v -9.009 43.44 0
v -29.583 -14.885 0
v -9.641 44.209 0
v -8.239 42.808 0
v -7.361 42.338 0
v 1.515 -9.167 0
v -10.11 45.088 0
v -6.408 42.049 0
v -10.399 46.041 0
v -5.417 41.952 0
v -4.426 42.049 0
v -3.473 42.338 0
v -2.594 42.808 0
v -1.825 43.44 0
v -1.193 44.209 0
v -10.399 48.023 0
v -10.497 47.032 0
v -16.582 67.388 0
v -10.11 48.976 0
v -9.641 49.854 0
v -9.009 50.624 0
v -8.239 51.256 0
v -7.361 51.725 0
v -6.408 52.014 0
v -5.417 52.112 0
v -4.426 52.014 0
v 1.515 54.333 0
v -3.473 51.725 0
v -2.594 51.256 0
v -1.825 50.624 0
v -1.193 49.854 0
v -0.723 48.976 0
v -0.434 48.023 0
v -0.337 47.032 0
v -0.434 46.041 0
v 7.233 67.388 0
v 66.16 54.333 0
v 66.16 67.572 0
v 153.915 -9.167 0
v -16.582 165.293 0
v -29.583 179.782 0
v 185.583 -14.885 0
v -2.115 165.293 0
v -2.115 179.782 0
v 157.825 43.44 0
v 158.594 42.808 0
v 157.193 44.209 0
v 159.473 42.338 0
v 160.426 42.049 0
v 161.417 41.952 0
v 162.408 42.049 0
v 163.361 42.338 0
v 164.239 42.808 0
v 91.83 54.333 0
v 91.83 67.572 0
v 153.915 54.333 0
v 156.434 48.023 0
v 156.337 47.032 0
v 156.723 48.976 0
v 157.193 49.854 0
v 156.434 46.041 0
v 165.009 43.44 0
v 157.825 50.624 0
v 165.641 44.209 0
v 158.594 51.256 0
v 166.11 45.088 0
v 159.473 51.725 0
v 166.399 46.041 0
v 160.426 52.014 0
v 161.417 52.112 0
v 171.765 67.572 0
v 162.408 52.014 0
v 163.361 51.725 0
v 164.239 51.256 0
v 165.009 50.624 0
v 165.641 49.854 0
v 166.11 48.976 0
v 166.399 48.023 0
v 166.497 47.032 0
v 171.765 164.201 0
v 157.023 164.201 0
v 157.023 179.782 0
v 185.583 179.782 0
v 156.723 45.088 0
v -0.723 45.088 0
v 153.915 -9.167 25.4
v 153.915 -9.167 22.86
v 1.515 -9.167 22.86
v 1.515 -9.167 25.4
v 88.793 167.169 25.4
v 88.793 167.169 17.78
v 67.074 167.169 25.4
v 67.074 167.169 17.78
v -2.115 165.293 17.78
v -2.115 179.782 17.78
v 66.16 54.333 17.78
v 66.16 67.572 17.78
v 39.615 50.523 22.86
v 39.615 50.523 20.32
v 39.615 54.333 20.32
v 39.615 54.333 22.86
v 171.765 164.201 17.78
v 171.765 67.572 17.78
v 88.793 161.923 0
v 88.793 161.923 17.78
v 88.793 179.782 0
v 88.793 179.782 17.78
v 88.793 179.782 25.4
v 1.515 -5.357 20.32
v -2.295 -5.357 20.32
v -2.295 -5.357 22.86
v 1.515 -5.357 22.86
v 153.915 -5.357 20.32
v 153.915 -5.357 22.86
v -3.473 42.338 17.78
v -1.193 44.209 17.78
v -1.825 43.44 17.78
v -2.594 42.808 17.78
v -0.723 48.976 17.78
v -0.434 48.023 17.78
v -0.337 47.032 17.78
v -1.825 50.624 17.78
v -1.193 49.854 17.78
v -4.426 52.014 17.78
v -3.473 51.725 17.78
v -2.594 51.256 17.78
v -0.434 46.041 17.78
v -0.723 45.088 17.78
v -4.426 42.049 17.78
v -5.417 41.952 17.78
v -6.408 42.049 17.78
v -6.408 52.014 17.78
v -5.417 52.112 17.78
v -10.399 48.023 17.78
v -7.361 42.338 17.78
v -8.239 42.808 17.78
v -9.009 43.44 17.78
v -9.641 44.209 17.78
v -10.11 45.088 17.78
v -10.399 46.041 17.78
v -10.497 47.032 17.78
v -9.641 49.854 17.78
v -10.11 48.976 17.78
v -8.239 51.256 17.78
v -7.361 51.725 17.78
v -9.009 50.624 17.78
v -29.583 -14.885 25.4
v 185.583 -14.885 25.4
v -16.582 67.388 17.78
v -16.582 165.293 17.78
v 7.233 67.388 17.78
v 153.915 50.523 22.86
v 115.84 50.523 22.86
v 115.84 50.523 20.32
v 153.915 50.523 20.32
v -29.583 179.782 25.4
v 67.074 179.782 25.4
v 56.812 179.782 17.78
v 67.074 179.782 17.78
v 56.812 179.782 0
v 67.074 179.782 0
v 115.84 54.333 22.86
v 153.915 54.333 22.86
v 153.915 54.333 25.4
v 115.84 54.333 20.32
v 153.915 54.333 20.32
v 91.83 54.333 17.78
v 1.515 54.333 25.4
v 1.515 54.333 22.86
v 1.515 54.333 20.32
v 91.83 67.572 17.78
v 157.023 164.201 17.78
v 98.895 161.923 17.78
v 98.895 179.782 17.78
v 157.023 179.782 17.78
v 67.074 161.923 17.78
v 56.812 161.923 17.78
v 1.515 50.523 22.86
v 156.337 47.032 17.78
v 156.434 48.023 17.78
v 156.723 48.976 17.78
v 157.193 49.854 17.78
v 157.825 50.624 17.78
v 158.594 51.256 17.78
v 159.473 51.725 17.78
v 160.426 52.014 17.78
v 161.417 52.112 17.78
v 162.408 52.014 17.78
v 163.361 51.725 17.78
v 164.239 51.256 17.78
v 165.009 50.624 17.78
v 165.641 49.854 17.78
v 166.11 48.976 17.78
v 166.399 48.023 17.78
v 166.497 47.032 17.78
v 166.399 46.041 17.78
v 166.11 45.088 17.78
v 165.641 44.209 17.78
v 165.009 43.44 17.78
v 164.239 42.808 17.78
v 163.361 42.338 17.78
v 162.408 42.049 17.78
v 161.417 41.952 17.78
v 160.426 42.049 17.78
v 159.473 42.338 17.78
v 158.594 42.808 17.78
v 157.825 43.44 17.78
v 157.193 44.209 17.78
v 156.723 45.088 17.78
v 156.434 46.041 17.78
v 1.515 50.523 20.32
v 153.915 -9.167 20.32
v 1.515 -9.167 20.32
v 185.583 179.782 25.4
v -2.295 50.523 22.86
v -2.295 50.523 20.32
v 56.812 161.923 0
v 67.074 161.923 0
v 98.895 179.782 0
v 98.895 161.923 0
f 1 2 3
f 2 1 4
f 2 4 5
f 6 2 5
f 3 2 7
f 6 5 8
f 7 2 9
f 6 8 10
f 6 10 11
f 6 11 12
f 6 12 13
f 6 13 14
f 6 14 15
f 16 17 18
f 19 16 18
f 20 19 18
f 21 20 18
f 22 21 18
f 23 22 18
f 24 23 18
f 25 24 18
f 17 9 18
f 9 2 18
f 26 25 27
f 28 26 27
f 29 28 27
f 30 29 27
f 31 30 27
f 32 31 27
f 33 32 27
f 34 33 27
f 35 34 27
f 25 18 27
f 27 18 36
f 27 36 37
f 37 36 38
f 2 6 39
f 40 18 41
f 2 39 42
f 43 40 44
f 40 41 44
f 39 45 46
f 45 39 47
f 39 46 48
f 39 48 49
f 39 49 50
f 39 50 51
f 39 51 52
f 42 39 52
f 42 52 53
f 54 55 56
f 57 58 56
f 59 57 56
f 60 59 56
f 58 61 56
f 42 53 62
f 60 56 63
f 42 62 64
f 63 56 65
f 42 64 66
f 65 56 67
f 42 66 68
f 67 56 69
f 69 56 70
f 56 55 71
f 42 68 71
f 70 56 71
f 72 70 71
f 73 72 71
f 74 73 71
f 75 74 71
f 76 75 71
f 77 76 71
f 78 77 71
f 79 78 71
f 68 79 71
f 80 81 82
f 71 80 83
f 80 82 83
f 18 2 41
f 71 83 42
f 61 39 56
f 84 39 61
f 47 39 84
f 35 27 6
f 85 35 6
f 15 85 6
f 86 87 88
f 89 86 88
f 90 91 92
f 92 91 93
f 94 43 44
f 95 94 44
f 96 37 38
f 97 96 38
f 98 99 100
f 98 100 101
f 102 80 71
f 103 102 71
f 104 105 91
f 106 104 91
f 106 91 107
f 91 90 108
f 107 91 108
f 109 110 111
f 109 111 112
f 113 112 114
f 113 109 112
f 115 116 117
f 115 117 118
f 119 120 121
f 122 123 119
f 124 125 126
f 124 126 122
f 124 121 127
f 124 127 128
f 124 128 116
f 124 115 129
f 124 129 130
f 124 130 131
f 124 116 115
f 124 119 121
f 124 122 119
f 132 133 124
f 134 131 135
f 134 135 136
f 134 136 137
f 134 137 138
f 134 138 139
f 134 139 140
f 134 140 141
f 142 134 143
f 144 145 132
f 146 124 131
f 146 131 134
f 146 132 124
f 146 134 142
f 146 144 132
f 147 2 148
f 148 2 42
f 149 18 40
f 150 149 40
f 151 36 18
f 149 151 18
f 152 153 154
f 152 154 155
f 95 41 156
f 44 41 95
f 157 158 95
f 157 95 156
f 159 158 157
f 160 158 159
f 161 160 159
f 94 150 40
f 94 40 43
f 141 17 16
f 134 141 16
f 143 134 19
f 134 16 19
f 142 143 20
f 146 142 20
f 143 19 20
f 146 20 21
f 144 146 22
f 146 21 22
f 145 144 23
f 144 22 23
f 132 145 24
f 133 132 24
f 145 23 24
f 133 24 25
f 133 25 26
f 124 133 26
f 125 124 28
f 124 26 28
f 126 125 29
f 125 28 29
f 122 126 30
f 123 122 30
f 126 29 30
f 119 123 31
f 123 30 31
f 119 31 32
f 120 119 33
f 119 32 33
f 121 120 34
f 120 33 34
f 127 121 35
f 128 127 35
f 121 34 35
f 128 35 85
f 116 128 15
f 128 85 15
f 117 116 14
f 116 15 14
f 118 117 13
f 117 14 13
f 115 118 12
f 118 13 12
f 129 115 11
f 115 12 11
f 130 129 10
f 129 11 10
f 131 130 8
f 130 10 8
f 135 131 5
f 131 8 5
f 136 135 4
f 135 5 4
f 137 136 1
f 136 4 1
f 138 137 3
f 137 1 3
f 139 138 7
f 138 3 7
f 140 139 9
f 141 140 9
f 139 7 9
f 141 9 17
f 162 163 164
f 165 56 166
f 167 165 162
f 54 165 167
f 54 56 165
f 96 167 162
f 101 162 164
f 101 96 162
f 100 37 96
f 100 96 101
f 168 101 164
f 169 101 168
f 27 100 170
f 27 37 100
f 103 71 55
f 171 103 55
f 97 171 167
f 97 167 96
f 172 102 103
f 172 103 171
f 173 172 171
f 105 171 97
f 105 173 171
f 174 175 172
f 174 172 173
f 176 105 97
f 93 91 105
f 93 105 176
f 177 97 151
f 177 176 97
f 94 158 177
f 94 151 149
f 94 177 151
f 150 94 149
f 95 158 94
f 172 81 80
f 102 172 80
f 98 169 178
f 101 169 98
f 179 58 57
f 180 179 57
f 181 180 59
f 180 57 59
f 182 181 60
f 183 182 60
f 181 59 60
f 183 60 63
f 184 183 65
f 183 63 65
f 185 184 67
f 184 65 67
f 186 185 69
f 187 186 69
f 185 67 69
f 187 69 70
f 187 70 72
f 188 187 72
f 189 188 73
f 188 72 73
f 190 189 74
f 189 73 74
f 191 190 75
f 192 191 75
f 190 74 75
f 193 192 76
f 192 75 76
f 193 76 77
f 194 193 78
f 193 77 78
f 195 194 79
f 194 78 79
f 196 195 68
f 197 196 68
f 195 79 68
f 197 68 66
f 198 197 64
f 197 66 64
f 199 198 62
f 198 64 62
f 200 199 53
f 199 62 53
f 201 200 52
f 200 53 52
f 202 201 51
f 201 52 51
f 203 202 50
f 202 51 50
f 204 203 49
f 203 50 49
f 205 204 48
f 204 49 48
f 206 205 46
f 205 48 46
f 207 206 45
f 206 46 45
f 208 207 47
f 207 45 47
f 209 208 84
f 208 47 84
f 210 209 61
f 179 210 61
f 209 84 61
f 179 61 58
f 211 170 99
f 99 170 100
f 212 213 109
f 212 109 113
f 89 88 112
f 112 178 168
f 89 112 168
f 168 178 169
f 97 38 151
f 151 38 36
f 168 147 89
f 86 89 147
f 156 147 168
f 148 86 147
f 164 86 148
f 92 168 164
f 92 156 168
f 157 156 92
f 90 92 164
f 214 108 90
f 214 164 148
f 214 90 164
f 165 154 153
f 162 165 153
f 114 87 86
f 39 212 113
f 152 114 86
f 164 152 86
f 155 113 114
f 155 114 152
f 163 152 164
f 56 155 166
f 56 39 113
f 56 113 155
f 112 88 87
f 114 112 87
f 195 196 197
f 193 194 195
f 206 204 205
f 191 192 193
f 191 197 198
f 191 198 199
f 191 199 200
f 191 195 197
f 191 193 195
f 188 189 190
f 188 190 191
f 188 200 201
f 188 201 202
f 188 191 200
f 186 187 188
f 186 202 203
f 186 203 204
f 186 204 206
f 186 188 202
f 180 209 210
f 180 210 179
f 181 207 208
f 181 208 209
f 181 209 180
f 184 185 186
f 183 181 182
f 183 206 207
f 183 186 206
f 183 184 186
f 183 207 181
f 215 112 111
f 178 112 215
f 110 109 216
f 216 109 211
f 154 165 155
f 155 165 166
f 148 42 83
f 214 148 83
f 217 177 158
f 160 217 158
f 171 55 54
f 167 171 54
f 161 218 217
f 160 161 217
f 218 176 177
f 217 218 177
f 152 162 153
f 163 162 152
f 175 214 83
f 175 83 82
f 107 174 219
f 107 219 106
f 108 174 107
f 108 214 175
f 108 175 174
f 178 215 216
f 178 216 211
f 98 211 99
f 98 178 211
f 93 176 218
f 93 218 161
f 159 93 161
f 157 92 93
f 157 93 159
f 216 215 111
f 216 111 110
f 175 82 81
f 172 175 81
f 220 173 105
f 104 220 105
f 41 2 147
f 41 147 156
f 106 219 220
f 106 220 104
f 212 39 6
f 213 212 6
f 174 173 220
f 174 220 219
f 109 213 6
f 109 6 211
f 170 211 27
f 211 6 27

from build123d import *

# Parameters (mm, degrees)
SKETCH1_W           = 215.166666666
SKETCH1_H           = 194.666666667
BOSS_EXTRUDE1_DEPTH = 25.4
SKETCH2_R           = 5.08
CUT_EXTRUDE1_DEPTH  = 17.78
SKETCH3_W           = 152.4
SKETCH3_H           = 63.5
CUT_EXTRUDE2_DEPTH  = 26.4
SKETCH4_W           = 21.718207711
SKETCH4_H           = 12.612953238
CUT_EXTRUDE3_DEPTH  = 26.4
SKETCH6_W           = 38.1
SKETCH6_H           = 2.54
SKETCH6_W_2         = 38.074968348
BOSS_EXTRUDE2_DEPTH = 3.81
SKETCH8_W           = 152.4
SKETCH8_H           = 2.54
BOSS_EXTRUDE3_DEPTH = 3.81
SKETCH9_W           = 2.54
SKETCH9_H           = 55.88
CUT_EXTRUDE8_DEPTH  = 3.81
SKETCH10_W          = 10.102446857
SKETCH10_H          = 17.859023659
SKETCH10_W_2        = 10.26192437
BOSS_EXTRUDE4_DEPTH = 17.78


with BuildPart() as part:
    # Sketch1 → Boss-Extrude1 (new body)
    with BuildSketch(Plane.XY):
        with Locations((78, 82.448428597)):
            Rectangle(SKETCH1_W, SKETCH1_H)
    extrude(amount=BOSS_EXTRUDE1_DEPTH)

    # Sketch2 → Cut-Extrude1 (cut)
    with BuildSketch(Plane(origin=(0, 0, 0), x_dir=(-1, 0, 0), z_dir=(0, 0, -1))):
        with Locations((5.416666667, 47.03176193)):
            Circle(SKETCH2_R)
        with Locations((-161.416666667, 47.03176193)):
            Circle(SKETCH2_R)
        Polygon((2.114639597, 179.78176193), (-157.022787609, 179.78176193), (-157.022787609, 164.200846175), (-171.765480067, 164.200846175), (-171.765480067, 67.571945264), (-148.766666667, 67.571945264), (-91.83014353, 67.571945264), (-91.83014353, 31.6046473), (-66.159852528, 31.6046473), (-66.159852528, 67.571945264), (-7.233333333, 67.387956716), (16.581678434, 67.387956716), (16.581678434, 165.292698163), (2.114639597, 165.292698163), align=None)
    extrude(amount=-CUT_EXTRUDE1_DEPTH, mode=Mode.SUBTRACT)

    # Sketch3 → Cut-Extrude2 (cut, through all)
    with BuildSketch(Plane(origin=(0, 0, 0), x_dir=(-1, 0, 0), z_dir=(0, 0, -1))):
        with Locations((-77.714845761, 22.583067422)):
            Rectangle(SKETCH3_W, SKETCH3_H)
    extrude(amount=-CUT_EXTRUDE2_DEPTH, mode=Mode.SUBTRACT)

    # Sketch4 → Cut-Extrude3 (cut, through all)
    with BuildSketch(Plane(origin=(0, 0, 0), x_dir=(-1, 0, 0), z_dir=(0, 0, -1))):
        with Locations((-77.933490884, 173.475285311)):
            Rectangle(SKETCH4_W, SKETCH4_H)
    extrude(amount=-CUT_EXTRUDE3_DEPTH, mode=Mode.SUBTRACT)

    # Sketch6 → Boss-Extrude2 (add)
    with BuildSketch(Plane.XZ.offset(-54.333067422)):
        with Locations((20.564845761, 21.59)):
            Rectangle(SKETCH6_W, SKETCH6_H)
        with Locations((134.877361587, 21.59)):
            Rectangle(SKETCH6_W_2, SKETCH6_H)
    extrude(amount=BOSS_EXTRUDE2_DEPTH)

    # Sketch8 → Boss-Extrude3 (add)
    with BuildSketch(Plane(origin=(0, -9.166932578, 0), x_dir=(1, 0, 0), z_dir=(0, 1, 0))):
        with Locations((77.714845761, -21.59)):
            Rectangle(SKETCH8_W, SKETCH8_H)
    extrude(amount=BOSS_EXTRUDE3_DEPTH)

    # Sketch9 → Cut-Extrude8 (cut)
    with BuildSketch(Plane(origin=(1.514845761, 0, 0), x_dir=(0, 0, -1), z_dir=(1, 0, 0))):
        with Locations((-21.59, 22.583067422)):
            Rectangle(SKETCH9_W, SKETCH9_H)
    extrude(amount=-CUT_EXTRUDE8_DEPTH, mode=Mode.SUBTRACT)

    # Sketch10 → Boss-Extrude4 (add)
    with BuildSketch(Plane(origin=(0, 0, 17.78), x_dir=(-1, 0, 0), z_dir=(0, 0, -1))):
        with Locations((-93.843818168, 170.852250101)):
            Rectangle(SKETCH10_W, SKETCH10_H)
        with Locations((-61.943424843, 170.852250101)):
            Rectangle(SKETCH10_W_2, SKETCH10_H)
    extrude(amount=BOSS_EXTRUDE4_DEPTH)


solid = part.part
